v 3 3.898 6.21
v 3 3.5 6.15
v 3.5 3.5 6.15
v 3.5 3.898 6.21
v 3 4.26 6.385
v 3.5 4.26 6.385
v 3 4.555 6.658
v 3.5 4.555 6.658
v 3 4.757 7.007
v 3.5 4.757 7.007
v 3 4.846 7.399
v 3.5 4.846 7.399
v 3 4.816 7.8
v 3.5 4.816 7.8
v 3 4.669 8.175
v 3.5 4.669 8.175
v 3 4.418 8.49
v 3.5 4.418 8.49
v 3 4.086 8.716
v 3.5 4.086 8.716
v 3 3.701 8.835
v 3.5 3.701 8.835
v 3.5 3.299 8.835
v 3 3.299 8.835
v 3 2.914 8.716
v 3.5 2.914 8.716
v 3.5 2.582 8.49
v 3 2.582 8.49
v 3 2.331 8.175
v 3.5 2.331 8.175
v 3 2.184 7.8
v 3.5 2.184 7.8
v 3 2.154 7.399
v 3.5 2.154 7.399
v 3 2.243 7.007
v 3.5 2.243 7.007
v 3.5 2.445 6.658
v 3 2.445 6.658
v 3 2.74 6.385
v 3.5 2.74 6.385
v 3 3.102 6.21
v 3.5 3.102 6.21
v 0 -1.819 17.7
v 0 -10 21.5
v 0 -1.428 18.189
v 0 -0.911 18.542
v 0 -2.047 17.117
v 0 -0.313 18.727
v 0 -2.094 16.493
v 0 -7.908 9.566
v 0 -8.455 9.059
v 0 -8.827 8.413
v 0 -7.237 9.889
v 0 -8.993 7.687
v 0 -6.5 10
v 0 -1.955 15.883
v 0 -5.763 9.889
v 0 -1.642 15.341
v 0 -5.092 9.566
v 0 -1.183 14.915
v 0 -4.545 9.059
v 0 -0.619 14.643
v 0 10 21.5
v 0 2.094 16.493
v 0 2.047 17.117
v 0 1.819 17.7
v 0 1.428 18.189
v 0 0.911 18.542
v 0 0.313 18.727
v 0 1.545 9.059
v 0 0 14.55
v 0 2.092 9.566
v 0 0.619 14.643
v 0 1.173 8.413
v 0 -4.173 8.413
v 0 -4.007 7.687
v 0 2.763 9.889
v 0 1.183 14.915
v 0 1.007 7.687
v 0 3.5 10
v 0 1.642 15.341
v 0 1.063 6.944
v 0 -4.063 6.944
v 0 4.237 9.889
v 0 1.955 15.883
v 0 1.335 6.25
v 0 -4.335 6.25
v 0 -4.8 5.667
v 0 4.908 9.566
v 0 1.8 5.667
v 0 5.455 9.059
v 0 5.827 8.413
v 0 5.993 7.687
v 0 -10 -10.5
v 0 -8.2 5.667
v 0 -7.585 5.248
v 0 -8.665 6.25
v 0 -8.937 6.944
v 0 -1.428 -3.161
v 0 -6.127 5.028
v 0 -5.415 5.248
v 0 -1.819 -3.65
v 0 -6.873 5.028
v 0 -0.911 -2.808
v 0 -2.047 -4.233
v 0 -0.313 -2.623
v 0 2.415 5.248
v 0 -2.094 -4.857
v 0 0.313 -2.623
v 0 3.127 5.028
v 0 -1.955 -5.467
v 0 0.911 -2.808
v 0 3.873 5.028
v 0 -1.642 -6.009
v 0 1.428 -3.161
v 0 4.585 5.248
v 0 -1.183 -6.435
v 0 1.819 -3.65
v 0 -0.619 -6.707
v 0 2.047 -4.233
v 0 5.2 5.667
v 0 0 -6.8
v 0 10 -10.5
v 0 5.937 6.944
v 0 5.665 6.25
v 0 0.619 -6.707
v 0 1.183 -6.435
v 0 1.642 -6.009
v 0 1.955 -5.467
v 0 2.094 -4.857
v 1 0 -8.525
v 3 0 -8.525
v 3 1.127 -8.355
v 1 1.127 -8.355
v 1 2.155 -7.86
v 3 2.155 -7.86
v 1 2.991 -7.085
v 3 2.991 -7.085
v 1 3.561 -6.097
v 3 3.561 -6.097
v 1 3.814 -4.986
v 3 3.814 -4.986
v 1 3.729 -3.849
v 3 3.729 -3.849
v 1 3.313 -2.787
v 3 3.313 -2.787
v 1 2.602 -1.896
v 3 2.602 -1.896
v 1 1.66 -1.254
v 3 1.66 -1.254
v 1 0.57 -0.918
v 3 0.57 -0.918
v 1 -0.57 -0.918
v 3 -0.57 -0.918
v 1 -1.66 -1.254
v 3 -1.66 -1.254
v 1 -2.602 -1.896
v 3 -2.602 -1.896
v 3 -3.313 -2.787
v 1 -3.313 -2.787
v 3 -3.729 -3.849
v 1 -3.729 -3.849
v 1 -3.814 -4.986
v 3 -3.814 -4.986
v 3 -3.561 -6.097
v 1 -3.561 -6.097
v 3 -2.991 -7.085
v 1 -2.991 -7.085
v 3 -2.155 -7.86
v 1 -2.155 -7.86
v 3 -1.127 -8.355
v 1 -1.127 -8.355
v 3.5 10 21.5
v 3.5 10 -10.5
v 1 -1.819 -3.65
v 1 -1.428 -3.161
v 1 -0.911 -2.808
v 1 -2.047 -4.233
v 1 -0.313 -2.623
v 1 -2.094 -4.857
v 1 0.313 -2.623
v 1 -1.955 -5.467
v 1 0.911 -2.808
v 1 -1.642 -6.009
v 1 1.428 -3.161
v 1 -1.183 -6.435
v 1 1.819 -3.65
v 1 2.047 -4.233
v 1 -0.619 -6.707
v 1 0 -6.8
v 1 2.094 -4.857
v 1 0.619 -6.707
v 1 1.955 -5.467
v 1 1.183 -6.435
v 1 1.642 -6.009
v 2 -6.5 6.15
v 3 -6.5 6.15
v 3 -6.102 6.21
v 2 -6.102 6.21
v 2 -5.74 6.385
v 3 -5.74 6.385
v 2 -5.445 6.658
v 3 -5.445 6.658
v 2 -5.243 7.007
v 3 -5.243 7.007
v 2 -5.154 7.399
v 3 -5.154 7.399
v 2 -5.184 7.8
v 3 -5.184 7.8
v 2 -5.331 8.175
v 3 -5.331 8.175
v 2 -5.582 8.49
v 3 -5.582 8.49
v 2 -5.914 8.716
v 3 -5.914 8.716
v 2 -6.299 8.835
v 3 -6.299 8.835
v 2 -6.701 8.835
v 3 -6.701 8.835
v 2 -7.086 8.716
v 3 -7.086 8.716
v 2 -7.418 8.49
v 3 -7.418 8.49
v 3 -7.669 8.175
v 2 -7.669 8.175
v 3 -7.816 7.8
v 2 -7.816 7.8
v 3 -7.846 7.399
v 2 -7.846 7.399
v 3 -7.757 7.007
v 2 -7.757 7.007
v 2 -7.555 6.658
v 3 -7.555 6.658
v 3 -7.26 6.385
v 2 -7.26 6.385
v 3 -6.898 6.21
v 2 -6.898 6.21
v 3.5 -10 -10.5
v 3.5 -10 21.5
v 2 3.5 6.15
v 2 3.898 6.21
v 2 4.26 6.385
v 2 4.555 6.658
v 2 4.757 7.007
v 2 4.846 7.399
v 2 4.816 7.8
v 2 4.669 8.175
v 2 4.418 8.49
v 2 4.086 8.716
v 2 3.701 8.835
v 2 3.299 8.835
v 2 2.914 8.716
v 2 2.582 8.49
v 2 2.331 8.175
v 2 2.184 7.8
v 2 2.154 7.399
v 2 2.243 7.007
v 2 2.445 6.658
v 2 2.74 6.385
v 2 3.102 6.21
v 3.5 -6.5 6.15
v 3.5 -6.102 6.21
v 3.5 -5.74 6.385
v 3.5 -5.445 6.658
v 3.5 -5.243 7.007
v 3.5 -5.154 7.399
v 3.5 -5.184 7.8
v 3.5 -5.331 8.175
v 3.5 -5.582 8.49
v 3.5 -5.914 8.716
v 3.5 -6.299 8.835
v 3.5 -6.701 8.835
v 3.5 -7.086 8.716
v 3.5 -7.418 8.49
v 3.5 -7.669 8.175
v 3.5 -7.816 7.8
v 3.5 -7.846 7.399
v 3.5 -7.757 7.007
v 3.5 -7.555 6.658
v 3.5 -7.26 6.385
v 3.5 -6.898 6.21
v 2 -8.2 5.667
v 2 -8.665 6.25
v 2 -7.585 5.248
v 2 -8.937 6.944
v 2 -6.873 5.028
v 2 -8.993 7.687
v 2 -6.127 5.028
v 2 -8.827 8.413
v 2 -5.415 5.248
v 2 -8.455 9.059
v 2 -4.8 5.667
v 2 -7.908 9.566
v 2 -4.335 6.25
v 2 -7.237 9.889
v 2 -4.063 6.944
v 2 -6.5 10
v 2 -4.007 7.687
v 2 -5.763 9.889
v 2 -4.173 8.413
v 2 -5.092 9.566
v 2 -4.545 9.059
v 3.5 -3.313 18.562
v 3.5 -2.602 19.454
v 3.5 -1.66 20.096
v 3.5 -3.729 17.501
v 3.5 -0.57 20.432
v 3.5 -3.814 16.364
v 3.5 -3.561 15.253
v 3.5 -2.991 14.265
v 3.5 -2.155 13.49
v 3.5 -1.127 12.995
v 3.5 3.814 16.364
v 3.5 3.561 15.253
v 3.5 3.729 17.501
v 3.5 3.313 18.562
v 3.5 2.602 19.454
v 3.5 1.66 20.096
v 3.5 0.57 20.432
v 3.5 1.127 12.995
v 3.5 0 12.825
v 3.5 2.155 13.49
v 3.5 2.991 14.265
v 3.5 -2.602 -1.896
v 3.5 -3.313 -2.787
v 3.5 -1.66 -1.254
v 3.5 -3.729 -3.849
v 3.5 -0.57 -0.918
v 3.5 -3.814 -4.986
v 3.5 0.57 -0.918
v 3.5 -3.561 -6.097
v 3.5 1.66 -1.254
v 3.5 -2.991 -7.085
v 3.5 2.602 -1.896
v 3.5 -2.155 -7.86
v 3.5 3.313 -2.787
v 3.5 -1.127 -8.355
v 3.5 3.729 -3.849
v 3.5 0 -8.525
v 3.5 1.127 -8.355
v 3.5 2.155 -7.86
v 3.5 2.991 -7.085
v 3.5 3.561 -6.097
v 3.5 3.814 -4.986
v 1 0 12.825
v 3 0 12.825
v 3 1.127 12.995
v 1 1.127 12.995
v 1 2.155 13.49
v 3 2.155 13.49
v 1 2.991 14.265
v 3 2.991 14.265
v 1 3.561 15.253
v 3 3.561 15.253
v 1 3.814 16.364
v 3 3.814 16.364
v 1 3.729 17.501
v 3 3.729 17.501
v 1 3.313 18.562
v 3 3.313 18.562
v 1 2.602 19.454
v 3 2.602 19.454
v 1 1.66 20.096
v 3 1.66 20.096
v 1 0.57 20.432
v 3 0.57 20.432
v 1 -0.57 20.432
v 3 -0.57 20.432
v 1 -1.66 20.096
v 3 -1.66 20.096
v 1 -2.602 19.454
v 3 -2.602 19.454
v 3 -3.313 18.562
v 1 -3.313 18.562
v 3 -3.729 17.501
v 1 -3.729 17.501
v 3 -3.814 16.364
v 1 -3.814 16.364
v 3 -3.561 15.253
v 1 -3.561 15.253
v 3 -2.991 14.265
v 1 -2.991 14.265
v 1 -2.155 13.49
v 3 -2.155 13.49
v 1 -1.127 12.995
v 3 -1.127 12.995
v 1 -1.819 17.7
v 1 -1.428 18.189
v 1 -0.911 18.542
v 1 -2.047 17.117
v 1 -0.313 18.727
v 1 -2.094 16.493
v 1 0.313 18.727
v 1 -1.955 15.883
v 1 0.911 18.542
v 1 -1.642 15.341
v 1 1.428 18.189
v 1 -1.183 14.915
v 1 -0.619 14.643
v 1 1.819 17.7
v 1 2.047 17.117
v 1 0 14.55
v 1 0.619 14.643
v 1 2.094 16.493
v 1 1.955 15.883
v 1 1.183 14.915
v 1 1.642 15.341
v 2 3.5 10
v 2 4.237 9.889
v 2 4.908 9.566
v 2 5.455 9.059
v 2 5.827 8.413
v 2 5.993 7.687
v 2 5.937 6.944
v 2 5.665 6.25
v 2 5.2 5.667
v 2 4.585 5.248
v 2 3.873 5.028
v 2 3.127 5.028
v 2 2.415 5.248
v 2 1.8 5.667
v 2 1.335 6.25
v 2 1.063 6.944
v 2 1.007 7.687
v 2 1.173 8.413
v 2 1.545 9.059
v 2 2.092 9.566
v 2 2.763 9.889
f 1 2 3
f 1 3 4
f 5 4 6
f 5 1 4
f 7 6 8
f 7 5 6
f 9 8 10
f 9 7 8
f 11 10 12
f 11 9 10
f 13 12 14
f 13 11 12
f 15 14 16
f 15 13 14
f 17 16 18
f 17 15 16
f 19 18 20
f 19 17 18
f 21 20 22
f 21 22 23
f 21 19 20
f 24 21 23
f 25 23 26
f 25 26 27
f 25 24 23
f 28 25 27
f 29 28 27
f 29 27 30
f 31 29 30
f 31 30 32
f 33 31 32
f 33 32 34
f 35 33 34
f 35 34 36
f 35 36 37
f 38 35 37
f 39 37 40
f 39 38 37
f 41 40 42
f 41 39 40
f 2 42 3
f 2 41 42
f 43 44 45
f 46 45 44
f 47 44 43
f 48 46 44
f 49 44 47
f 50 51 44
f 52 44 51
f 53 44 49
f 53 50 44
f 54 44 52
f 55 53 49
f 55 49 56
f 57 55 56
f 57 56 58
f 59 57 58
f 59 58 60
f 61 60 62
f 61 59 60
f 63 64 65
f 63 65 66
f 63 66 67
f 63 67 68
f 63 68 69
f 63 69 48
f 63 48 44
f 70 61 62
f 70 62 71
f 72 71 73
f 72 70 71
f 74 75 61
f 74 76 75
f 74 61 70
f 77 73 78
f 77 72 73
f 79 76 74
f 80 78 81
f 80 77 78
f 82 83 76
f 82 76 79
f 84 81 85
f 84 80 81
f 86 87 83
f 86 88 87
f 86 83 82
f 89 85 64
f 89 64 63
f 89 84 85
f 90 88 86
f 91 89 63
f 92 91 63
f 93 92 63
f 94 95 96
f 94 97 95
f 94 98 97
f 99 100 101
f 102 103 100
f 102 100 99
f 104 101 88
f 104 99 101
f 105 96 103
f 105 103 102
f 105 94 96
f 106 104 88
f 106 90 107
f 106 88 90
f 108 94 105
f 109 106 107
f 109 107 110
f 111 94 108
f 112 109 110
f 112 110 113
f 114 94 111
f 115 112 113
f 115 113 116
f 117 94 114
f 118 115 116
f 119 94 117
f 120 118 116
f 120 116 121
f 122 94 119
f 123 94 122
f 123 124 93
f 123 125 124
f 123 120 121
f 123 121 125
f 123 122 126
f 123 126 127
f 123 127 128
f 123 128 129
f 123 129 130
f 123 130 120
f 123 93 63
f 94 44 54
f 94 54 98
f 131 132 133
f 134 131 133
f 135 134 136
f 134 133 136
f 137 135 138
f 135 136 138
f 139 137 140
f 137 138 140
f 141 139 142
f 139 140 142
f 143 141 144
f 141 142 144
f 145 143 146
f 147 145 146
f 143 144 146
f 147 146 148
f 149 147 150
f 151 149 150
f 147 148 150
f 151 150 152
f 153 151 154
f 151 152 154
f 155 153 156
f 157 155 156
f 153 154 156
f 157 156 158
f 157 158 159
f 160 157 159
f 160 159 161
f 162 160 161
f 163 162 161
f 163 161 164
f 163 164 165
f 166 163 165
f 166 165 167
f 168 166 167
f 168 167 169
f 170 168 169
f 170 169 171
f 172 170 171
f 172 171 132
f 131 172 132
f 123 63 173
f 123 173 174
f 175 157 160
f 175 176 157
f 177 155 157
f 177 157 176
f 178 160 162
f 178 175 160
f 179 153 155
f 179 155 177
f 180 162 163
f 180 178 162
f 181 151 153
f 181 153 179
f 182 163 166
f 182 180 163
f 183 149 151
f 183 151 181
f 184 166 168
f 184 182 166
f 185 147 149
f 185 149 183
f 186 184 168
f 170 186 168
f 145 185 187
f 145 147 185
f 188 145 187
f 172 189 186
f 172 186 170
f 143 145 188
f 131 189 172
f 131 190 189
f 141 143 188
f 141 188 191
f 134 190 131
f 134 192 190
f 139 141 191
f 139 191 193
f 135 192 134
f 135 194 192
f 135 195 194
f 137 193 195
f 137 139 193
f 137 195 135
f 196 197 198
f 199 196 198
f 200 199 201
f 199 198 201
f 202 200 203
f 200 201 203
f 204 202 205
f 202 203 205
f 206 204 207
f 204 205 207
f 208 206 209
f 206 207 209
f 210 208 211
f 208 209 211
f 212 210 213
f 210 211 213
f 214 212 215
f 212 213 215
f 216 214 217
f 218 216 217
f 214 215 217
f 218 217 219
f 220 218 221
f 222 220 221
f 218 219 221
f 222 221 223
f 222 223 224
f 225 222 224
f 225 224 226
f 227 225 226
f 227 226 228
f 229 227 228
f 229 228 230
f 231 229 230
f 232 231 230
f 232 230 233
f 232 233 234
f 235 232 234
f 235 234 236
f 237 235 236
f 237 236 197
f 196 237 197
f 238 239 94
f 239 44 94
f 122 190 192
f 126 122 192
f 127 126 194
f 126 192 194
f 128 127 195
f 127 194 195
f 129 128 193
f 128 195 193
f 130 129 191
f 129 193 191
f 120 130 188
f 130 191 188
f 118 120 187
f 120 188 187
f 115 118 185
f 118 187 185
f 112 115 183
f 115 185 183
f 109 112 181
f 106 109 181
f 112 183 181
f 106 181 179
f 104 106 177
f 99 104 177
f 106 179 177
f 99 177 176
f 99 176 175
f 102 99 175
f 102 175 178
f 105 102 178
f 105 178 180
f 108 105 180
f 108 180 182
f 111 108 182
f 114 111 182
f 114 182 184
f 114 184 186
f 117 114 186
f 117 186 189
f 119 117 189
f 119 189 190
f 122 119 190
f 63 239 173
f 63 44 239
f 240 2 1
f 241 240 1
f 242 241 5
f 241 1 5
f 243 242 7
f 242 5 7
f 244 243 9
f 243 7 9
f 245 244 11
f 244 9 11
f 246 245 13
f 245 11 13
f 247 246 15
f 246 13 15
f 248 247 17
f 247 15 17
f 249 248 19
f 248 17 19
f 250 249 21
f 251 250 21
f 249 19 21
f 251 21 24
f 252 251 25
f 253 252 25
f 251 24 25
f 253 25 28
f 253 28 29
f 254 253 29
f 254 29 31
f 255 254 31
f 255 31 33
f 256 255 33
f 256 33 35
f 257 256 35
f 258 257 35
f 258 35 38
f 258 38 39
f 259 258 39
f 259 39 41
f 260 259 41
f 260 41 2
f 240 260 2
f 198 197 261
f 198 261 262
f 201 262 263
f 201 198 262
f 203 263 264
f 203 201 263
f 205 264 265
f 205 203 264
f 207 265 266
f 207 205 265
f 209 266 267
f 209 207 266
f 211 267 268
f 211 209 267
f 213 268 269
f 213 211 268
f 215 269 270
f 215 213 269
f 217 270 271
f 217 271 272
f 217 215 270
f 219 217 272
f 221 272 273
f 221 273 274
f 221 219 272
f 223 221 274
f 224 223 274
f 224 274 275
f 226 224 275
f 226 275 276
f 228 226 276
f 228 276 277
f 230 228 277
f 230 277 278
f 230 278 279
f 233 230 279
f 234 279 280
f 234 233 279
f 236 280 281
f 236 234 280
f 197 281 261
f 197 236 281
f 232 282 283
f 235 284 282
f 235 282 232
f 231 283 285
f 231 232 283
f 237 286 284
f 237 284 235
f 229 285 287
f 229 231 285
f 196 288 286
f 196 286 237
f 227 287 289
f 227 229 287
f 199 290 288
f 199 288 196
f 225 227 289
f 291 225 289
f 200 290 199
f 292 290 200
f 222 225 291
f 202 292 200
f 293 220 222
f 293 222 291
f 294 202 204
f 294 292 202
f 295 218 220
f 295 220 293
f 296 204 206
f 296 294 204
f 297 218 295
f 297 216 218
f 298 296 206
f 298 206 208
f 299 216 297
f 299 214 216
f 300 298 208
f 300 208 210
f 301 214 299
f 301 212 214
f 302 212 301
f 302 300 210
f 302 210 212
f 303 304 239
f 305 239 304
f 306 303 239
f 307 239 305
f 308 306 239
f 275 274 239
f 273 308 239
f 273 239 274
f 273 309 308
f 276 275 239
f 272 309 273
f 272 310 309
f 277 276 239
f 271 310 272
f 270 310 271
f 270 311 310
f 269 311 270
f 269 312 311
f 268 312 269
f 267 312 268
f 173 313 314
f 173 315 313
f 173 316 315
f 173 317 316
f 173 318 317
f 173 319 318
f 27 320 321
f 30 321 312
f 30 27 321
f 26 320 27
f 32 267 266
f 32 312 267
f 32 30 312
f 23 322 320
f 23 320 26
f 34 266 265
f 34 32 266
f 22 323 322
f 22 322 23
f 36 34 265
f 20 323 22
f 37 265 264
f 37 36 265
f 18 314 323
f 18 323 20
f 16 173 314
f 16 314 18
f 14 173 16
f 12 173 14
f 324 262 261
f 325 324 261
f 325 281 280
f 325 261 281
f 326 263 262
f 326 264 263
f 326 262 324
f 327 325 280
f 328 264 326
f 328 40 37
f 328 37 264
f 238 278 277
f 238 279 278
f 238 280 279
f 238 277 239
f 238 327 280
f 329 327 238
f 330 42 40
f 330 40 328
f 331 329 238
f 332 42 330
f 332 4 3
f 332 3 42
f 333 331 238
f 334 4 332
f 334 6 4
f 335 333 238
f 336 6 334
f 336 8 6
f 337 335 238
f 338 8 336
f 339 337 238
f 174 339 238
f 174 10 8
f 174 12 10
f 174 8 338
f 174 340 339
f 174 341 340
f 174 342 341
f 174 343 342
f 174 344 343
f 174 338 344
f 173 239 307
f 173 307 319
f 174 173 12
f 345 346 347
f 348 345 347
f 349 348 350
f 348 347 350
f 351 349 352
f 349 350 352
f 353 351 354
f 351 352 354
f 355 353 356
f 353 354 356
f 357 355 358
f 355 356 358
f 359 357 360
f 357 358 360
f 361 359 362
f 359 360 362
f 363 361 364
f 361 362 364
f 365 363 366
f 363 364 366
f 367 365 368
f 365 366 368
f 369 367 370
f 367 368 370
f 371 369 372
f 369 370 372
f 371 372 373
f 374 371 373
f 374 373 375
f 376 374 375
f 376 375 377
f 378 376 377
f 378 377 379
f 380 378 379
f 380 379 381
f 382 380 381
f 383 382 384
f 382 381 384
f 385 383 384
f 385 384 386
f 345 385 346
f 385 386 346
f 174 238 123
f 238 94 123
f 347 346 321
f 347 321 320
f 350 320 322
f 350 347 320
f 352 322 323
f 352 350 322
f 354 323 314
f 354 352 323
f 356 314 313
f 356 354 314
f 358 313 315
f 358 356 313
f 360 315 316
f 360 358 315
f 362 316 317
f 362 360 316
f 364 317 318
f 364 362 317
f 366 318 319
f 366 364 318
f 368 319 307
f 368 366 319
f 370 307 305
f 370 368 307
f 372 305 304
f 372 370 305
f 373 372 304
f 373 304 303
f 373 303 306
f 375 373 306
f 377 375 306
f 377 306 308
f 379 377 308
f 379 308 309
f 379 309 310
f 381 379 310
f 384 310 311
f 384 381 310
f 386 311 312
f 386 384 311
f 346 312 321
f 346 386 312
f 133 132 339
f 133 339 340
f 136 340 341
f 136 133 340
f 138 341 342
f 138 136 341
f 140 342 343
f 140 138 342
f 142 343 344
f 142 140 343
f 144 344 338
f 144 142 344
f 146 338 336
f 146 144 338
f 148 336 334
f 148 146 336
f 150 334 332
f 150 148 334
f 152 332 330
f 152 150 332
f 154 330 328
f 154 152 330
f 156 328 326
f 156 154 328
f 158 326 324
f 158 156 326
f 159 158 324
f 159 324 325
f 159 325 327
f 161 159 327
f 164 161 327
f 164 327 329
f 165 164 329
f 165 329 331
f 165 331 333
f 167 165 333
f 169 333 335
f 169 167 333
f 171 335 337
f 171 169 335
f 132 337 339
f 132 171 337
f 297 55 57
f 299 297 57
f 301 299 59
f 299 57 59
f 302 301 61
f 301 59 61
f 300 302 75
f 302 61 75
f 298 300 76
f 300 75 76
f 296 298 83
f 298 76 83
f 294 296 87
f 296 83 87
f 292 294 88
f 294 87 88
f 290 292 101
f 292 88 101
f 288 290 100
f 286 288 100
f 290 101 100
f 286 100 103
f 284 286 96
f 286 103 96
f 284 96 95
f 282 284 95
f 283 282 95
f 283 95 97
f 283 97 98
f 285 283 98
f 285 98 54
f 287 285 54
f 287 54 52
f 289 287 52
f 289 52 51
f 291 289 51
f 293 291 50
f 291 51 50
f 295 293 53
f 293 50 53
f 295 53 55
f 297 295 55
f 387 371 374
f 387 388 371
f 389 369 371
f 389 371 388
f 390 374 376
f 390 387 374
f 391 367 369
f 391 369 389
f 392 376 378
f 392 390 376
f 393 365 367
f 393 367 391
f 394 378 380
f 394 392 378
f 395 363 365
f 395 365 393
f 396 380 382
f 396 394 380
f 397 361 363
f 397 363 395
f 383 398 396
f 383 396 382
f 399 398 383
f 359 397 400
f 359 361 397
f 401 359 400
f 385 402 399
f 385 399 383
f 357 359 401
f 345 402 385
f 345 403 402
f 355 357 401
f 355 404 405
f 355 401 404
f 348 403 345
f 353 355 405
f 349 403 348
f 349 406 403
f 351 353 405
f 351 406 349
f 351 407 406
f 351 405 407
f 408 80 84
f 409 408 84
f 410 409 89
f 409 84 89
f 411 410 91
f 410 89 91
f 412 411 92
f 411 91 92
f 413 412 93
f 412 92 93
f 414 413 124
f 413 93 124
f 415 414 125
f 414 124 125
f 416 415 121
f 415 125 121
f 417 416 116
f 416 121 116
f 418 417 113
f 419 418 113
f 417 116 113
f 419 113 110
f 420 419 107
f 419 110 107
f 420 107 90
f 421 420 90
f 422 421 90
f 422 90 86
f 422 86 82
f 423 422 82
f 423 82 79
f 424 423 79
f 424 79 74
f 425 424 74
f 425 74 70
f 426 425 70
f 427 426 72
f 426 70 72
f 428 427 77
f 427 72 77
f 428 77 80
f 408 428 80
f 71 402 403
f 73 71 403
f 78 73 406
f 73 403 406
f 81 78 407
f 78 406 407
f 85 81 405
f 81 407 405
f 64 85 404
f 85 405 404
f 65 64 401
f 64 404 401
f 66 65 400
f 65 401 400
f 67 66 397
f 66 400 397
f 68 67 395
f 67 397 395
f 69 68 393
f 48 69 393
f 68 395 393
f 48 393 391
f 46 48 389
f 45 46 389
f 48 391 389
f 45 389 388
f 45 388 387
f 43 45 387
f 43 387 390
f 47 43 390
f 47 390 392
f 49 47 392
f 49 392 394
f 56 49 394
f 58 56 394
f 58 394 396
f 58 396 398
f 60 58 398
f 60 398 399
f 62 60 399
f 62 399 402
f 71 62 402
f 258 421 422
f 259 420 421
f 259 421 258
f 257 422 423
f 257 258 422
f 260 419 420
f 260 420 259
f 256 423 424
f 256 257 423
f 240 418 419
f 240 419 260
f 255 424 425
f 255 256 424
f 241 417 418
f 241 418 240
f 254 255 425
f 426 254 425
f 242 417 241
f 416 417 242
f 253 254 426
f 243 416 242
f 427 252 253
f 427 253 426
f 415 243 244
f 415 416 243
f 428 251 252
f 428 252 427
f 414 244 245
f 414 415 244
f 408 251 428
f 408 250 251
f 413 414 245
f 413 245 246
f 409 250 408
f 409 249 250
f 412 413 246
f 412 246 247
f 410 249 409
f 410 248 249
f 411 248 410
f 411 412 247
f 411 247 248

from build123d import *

# Parameters (mm, degrees)
CROQUIS1_W              = 21
CROQUIS1_H              = 20
SALIENTE_EXTRUIR1_DEPTH = 5
CROQUIS2_R              = 1.35
CORTAR_EXTRUIR1_DEPTH   = 6
CROQUIS3_R              = 2.5
CORTAR_EXTRUIR2_DEPTH   = 2
CROQUIS4_R              = 2.1
CORTAR_EXTRUIR3_DEPTH   = 6
CROQUIS5_R              = 3.825
CORTAR_EXTRUIR4_DEPTH   = 4
CROQUIS7_W              = 21
CROQUIS7_H              = 20
CORTAR_EXTRUIR5_DEPTH   = 2
CROQUIS8_W              = 3
CROQUIS8_H              = 20
SALIENTE_EXTRUIR2_DEPTH = 11
CROQUIS9_R              = 2.1
CORTAR_EXTRUIR6_DEPTH   = 4
CROQUIS10_R             = 3.825
CORTAR_EXTRUIR7_DEPTH   = 2
CROQUIS11_W             = 32
CROQUIS11_H             = 20
CROQUIS11_R             = 3.825
CROQUIS11_R_2           = 1.35
SALIENTE_EXTRUIR3_DEPTH = 0.5


with BuildPart() as part:
    # Croquis1 → Saliente-Extruir1 (new body)
    with BuildSketch(Plane(origin=(0, 0, 0), x_dir=(0, 0, -1), z_dir=(1, 0, 0))):
        Rectangle(CROQUIS1_W, CROQUIS1_H)
    extrude(amount=SALIENTE_EXTRUIR1_DEPTH)

    # Croquis2 → Cortar-Extruir1 (cut, through all)
    with BuildSketch(Plane(origin=(5, 0, 0), x_dir=(0, 0, -1), z_dir=(1, 0, 0))):
        with Locations((-7.5, 3.5)):
            Circle(CROQUIS2_R)
        with Locations((-7.5, -6.5)):
            Circle(CROQUIS2_R)
    extrude(amount=-CORTAR_EXTRUIR1_DEPTH, mode=Mode.SUBTRACT)

    # Croquis3 → Cortar-Extruir2 (cut)
    with BuildSketch(Plane.ZY):
        with Locations((7.5, 3.5)):
            Circle(CROQUIS3_R)
        with Locations((7.5, -6.5)):
            Circle(CROQUIS3_R)
    extrude(amount=-CORTAR_EXTRUIR2_DEPTH, mode=Mode.SUBTRACT)

    # Croquis4 → Cortar-Extruir3 (cut, through all)
    with BuildSketch(Plane(origin=(5, 0, 0), x_dir=(0, 0, -1), z_dir=(1, 0, 0))):
        with Locations((4.7, 0)):
            Circle(CROQUIS4_R)
    extrude(amount=-CORTAR_EXTRUIR3_DEPTH, mode=Mode.SUBTRACT)

    # Croquis5 → Cortar-Extruir4 (cut)
    with BuildSketch(Plane(origin=(5, 0, 0), x_dir=(0, 0, -1), z_dir=(1, 0, 0))):
        with Locations((4.7, 0)):
            Circle(CROQUIS5_R)
    extrude(amount=-CORTAR_EXTRUIR4_DEPTH, mode=Mode.SUBTRACT)

    # Croquis7 → Cortar-Extruir5 (cut)
    with BuildSketch(Plane(origin=(5, 0, 0), x_dir=(0, 0, -1), z_dir=(1, 0, 0))):
        Rectangle(CROQUIS7_W, CROQUIS7_H)
    extrude(amount=-CORTAR_EXTRUIR5_DEPTH, mode=Mode.SUBTRACT)

    # Croquis8 → Saliente-Extruir2 (add)
    with BuildSketch(Plane.XY.offset(10.5)):
        with Locations((1.5, 0)):
            Rectangle(CROQUIS8_W, CROQUIS8_H)
    extrude(amount=SALIENTE_EXTRUIR2_DEPTH)

    # Croquis9 → Cortar-Extruir6 (cut, through all)
    with BuildSketch(Plane(origin=(3, 0, 0), x_dir=(0, 0, -1), z_dir=(1, 0, 0))):
        with Locations((-16.65, 0)):
            Circle(CROQUIS9_R)
    extrude(amount=-CORTAR_EXTRUIR6_DEPTH, mode=Mode.SUBTRACT)

    # Croquis10 → Cortar-Extruir7 (cut)
    with BuildSketch(Plane(origin=(3, 0, 0), x_dir=(0, 0, -1), z_dir=(1, 0, 0))):
        with Locations((-16.65, 0)):
            Circle(CROQUIS10_R)
    extrude(amount=-CORTAR_EXTRUIR7_DEPTH, mode=Mode.SUBTRACT)

    # Croquis11 → Saliente-Extruir3 (add)
    with BuildSketch(Plane(origin=(3, 0, 0), x_dir=(0, 0, -1), z_dir=(1, 0, 0))):
        with Locations((-5.5, 0)):
            Rectangle(CROQUIS11_W, CROQUIS11_H)
        with Locations((-16.65, 0)):
            Circle(CROQUIS11_R, mode=Mode.SUBTRACT)
        with Locations((-7.5, 3.5)):
            Circle(CROQUIS11_R_2, mode=Mode.SUBTRACT)
        with Locations((-7.5, -6.5)):
            Circle(CROQUIS11_R_2, mode=Mode.SUBTRACT)
        with Locations((4.7, 0)):
            Circle(CROQUIS11_R, mode=Mode.SUBTRACT)
    extrude(amount=SALIENTE_EXTRUIR3_DEPTH)


solid = part.part
